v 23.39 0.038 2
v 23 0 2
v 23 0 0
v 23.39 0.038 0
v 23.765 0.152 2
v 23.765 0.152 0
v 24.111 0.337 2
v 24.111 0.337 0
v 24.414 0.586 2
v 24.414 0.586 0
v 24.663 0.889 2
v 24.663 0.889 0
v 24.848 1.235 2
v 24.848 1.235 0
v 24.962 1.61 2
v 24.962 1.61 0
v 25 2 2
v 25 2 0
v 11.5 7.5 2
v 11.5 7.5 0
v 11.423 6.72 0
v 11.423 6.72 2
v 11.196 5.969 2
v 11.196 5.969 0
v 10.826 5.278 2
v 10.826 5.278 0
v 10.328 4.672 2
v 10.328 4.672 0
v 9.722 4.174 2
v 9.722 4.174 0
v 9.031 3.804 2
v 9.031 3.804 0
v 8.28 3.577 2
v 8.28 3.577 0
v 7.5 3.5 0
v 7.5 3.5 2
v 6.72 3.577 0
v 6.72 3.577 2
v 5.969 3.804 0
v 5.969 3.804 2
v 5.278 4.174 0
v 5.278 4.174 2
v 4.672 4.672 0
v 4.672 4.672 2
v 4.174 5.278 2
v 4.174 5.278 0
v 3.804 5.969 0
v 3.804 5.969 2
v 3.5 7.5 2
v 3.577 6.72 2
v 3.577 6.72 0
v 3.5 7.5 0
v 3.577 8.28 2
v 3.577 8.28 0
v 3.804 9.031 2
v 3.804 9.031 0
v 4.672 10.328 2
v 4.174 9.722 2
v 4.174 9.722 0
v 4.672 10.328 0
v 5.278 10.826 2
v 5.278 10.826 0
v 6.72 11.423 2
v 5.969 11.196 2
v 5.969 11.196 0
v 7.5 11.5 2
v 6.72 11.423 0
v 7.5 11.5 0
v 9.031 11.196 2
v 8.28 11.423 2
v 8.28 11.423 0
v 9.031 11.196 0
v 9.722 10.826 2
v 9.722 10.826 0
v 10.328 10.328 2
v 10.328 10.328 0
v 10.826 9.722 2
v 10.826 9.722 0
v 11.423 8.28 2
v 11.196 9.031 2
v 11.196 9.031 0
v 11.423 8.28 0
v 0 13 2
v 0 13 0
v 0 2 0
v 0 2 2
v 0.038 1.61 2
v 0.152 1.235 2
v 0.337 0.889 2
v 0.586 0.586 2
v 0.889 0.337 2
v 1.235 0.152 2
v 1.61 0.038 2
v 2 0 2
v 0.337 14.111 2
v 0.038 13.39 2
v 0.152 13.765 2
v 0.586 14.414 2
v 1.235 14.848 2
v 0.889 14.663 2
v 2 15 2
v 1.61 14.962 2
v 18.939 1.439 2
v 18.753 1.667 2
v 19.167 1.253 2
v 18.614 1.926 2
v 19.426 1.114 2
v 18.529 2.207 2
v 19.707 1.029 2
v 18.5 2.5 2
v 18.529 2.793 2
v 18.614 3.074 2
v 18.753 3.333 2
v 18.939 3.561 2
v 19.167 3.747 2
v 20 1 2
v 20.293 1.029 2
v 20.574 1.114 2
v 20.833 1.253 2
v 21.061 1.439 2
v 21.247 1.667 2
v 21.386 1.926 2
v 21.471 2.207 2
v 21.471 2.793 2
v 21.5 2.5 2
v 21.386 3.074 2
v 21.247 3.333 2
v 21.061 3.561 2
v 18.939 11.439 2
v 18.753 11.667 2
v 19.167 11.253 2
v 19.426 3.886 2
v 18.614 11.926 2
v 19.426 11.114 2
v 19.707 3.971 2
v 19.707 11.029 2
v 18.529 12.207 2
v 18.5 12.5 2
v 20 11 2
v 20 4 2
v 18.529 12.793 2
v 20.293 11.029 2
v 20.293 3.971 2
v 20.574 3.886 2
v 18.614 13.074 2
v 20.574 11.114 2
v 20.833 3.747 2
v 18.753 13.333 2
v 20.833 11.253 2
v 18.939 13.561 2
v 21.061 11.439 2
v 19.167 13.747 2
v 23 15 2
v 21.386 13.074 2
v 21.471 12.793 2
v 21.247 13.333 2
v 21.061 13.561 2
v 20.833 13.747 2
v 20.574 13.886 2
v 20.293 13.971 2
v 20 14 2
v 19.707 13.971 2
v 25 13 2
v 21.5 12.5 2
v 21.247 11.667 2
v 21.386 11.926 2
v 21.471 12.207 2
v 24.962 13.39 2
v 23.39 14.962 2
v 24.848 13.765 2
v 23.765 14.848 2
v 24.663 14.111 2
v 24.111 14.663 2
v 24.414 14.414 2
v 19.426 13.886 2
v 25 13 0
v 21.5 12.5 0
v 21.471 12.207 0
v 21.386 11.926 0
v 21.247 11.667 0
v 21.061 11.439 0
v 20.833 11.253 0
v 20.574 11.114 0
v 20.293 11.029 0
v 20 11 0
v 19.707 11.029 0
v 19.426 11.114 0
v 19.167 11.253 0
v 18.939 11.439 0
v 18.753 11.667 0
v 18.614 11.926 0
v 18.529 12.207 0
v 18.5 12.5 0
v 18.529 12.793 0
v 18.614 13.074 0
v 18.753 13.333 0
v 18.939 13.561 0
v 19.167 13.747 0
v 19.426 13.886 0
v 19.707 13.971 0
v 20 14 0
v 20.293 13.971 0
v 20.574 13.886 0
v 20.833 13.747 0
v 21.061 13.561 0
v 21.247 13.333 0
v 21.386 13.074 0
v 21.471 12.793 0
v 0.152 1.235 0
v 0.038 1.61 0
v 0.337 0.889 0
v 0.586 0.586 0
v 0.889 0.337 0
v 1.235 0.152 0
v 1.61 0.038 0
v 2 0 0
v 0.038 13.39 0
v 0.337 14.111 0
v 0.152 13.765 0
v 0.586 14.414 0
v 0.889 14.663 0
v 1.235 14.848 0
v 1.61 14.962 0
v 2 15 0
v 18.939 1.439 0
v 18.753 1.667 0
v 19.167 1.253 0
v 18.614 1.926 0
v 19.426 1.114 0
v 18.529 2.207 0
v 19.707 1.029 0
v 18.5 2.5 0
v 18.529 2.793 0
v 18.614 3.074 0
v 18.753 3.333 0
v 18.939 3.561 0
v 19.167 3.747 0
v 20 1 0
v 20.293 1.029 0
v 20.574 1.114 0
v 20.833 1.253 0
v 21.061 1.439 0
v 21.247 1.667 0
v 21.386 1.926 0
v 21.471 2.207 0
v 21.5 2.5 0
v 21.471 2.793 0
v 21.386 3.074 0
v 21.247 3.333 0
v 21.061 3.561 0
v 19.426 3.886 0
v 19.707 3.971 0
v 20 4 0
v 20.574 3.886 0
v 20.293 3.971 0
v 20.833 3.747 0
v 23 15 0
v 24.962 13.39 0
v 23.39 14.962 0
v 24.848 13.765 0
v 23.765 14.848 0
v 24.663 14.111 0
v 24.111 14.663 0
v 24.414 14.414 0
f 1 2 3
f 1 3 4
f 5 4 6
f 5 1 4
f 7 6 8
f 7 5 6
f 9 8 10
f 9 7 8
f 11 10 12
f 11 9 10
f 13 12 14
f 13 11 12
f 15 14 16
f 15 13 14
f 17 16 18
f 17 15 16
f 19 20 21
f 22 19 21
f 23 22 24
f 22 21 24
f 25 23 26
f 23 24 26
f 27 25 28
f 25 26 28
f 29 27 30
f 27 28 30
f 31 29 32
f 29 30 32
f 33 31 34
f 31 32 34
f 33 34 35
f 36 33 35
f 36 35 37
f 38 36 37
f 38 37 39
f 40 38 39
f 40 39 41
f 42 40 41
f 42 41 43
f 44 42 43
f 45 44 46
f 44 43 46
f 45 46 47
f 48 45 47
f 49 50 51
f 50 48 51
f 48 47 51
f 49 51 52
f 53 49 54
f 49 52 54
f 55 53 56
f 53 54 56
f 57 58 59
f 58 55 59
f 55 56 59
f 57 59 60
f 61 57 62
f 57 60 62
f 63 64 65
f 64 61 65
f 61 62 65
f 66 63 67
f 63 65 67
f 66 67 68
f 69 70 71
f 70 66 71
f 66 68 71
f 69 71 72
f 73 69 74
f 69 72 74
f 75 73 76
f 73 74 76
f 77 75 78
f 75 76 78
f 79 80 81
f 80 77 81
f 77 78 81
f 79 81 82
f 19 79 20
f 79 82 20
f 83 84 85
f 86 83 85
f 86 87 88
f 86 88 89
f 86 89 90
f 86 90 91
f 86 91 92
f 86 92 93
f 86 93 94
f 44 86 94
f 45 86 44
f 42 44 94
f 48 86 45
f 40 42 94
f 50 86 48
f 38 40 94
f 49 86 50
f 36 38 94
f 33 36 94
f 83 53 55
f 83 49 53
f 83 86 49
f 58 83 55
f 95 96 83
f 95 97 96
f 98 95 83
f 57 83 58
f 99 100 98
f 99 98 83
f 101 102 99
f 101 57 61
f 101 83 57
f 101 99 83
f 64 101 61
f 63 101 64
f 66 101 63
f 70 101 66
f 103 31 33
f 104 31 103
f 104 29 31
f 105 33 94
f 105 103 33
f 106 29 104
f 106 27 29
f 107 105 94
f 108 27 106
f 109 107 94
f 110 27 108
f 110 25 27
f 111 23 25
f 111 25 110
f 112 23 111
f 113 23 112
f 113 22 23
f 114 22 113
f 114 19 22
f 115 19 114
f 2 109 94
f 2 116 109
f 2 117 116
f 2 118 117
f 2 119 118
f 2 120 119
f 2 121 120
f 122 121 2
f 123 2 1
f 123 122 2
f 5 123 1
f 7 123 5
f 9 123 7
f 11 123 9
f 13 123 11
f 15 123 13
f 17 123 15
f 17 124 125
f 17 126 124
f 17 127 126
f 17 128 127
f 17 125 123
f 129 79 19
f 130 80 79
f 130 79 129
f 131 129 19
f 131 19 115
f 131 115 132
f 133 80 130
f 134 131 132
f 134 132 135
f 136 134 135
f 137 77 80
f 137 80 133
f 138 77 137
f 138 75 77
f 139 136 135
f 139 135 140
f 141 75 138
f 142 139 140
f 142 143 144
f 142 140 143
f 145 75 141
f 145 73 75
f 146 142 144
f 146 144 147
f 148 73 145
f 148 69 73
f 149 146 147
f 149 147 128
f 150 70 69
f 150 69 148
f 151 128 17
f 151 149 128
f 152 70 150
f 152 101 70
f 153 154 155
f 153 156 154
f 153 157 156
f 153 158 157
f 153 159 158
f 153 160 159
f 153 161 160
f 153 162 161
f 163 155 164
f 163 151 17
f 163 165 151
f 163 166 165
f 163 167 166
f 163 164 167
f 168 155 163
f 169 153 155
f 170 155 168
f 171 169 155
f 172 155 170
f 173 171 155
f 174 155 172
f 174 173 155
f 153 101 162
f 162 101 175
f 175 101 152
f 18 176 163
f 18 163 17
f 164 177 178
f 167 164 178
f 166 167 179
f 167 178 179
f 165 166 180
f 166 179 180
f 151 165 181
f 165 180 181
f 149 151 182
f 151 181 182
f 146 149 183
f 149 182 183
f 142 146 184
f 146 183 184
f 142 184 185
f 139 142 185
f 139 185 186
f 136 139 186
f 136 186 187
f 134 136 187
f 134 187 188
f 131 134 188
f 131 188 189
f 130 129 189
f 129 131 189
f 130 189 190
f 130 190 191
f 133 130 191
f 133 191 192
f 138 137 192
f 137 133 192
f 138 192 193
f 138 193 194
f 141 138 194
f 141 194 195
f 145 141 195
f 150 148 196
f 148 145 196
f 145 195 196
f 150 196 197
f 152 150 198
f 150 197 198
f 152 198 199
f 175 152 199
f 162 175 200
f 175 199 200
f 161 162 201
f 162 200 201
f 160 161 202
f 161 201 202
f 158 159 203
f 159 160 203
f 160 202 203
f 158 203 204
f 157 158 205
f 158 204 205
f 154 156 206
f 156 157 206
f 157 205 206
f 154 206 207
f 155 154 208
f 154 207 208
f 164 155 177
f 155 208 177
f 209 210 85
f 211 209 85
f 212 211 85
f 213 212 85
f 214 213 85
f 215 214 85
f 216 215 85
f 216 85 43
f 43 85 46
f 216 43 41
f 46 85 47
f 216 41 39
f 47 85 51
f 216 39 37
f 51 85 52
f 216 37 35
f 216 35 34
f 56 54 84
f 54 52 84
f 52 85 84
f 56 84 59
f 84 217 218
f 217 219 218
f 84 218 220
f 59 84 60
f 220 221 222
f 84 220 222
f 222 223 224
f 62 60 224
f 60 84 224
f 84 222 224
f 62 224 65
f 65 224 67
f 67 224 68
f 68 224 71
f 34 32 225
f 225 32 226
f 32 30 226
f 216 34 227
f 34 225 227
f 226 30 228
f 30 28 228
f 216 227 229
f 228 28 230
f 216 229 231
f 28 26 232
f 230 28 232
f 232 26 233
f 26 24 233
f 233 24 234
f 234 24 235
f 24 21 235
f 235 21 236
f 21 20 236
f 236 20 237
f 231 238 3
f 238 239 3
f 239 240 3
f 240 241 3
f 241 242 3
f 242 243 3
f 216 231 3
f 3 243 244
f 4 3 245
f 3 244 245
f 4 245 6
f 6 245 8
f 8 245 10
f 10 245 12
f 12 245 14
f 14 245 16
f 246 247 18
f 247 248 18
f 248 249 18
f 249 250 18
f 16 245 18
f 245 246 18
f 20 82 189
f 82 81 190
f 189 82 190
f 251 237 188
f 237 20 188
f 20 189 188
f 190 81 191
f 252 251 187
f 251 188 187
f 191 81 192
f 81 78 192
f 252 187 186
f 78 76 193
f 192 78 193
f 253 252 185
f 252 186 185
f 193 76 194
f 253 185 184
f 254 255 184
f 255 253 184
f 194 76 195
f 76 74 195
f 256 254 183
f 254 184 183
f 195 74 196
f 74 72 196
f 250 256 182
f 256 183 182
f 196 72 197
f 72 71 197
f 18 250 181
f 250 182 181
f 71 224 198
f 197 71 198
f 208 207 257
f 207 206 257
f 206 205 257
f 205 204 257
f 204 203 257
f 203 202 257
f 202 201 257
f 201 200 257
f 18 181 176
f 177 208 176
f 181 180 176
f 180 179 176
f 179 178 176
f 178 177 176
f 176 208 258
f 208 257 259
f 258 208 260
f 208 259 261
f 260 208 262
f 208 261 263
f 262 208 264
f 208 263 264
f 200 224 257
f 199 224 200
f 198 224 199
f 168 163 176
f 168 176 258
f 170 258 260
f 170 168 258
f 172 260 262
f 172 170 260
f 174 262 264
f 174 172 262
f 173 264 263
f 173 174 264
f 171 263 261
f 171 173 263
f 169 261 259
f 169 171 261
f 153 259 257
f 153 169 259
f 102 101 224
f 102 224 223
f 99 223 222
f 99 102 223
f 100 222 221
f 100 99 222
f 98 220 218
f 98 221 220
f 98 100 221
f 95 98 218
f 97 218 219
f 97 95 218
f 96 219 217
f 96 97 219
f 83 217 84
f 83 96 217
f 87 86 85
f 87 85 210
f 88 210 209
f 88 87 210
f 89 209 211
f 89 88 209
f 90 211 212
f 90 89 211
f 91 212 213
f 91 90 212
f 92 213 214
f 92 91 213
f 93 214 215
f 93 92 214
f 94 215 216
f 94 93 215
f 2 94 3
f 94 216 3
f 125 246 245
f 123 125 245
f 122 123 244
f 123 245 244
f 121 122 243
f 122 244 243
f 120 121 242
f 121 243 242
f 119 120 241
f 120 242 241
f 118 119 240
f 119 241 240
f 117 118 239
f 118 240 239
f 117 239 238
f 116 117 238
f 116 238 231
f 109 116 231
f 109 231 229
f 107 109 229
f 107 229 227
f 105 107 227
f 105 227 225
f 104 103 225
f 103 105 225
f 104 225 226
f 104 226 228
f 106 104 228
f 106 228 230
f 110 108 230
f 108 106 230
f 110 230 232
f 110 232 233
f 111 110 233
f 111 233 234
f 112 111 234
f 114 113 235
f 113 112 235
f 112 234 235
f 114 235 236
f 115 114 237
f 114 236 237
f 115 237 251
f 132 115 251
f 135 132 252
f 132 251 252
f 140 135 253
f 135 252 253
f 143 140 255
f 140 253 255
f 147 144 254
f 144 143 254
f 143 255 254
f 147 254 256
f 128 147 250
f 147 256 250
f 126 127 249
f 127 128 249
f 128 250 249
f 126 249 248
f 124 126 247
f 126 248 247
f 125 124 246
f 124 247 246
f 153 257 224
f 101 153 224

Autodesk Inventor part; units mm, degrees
ref_plane "YZ Plane" through (0, 0, 0) normal (1, 0, 0) x (0, 1, 0)
ref_plane "XZ Plane" through (0, 0, 0) normal (0, 1, 0) x (-1, 0, 0)
ref_plane "XY Plane" through (0, 0, 0) normal (0, 0, 1) x (1, 0, 0)
sketch "スケッチ1" plane through (0, 0, 0) normal (0, 0, 1) x (1, 0, 0)
  line L0 (0, 0) -> (15, 0)
  line L1 (15, 0) -> (15, 15)
  line L2 (15, 15) -> (0, 15)
  line L3 (0, 15) -> (0, 0)
  circle A0 centre (7.5, 7.5) radius 4
  line L4 (15, 15) -> (25, 15)
  line L5 (25, 15) -> (25, 0)
  line L6 (25, 0) -> (15, 0)
  line L7 (15, 0) -> (15, 15)
  circle A1 centre (20, 12.5) radius 1.5
  circle A2 centre (20, 2.5) radius 1.5
  dimension "d0" = 15
  dimension "d1" = 15
  dimension "d2" = 8
  dimension "d3" = 7.5
  dimension "d4" = 7.5
  dimension "d5" = 10
  dimension "d6" = 10
  dimension "d7" = 2.5
  dimension "d8" = 2.5
  dimension "d9" = 3
  dimension "d10" = 3
extrude "押し出し1" add sketch "スケッチ1" along normal blind 2
fillet "フィレット1" radius 2 4 edges at (0, 15, 1) (0, 0, 1) (25, 0, 1) (25, 15, 1)
equation "\"d1\" = d0"
equation "\"d3\" = 0.5 * d0"
equation "\"d4\" = 0.5 * d1"
properties part number "finger_al_mk_1" material "アルミニウム 6061-AHC"
